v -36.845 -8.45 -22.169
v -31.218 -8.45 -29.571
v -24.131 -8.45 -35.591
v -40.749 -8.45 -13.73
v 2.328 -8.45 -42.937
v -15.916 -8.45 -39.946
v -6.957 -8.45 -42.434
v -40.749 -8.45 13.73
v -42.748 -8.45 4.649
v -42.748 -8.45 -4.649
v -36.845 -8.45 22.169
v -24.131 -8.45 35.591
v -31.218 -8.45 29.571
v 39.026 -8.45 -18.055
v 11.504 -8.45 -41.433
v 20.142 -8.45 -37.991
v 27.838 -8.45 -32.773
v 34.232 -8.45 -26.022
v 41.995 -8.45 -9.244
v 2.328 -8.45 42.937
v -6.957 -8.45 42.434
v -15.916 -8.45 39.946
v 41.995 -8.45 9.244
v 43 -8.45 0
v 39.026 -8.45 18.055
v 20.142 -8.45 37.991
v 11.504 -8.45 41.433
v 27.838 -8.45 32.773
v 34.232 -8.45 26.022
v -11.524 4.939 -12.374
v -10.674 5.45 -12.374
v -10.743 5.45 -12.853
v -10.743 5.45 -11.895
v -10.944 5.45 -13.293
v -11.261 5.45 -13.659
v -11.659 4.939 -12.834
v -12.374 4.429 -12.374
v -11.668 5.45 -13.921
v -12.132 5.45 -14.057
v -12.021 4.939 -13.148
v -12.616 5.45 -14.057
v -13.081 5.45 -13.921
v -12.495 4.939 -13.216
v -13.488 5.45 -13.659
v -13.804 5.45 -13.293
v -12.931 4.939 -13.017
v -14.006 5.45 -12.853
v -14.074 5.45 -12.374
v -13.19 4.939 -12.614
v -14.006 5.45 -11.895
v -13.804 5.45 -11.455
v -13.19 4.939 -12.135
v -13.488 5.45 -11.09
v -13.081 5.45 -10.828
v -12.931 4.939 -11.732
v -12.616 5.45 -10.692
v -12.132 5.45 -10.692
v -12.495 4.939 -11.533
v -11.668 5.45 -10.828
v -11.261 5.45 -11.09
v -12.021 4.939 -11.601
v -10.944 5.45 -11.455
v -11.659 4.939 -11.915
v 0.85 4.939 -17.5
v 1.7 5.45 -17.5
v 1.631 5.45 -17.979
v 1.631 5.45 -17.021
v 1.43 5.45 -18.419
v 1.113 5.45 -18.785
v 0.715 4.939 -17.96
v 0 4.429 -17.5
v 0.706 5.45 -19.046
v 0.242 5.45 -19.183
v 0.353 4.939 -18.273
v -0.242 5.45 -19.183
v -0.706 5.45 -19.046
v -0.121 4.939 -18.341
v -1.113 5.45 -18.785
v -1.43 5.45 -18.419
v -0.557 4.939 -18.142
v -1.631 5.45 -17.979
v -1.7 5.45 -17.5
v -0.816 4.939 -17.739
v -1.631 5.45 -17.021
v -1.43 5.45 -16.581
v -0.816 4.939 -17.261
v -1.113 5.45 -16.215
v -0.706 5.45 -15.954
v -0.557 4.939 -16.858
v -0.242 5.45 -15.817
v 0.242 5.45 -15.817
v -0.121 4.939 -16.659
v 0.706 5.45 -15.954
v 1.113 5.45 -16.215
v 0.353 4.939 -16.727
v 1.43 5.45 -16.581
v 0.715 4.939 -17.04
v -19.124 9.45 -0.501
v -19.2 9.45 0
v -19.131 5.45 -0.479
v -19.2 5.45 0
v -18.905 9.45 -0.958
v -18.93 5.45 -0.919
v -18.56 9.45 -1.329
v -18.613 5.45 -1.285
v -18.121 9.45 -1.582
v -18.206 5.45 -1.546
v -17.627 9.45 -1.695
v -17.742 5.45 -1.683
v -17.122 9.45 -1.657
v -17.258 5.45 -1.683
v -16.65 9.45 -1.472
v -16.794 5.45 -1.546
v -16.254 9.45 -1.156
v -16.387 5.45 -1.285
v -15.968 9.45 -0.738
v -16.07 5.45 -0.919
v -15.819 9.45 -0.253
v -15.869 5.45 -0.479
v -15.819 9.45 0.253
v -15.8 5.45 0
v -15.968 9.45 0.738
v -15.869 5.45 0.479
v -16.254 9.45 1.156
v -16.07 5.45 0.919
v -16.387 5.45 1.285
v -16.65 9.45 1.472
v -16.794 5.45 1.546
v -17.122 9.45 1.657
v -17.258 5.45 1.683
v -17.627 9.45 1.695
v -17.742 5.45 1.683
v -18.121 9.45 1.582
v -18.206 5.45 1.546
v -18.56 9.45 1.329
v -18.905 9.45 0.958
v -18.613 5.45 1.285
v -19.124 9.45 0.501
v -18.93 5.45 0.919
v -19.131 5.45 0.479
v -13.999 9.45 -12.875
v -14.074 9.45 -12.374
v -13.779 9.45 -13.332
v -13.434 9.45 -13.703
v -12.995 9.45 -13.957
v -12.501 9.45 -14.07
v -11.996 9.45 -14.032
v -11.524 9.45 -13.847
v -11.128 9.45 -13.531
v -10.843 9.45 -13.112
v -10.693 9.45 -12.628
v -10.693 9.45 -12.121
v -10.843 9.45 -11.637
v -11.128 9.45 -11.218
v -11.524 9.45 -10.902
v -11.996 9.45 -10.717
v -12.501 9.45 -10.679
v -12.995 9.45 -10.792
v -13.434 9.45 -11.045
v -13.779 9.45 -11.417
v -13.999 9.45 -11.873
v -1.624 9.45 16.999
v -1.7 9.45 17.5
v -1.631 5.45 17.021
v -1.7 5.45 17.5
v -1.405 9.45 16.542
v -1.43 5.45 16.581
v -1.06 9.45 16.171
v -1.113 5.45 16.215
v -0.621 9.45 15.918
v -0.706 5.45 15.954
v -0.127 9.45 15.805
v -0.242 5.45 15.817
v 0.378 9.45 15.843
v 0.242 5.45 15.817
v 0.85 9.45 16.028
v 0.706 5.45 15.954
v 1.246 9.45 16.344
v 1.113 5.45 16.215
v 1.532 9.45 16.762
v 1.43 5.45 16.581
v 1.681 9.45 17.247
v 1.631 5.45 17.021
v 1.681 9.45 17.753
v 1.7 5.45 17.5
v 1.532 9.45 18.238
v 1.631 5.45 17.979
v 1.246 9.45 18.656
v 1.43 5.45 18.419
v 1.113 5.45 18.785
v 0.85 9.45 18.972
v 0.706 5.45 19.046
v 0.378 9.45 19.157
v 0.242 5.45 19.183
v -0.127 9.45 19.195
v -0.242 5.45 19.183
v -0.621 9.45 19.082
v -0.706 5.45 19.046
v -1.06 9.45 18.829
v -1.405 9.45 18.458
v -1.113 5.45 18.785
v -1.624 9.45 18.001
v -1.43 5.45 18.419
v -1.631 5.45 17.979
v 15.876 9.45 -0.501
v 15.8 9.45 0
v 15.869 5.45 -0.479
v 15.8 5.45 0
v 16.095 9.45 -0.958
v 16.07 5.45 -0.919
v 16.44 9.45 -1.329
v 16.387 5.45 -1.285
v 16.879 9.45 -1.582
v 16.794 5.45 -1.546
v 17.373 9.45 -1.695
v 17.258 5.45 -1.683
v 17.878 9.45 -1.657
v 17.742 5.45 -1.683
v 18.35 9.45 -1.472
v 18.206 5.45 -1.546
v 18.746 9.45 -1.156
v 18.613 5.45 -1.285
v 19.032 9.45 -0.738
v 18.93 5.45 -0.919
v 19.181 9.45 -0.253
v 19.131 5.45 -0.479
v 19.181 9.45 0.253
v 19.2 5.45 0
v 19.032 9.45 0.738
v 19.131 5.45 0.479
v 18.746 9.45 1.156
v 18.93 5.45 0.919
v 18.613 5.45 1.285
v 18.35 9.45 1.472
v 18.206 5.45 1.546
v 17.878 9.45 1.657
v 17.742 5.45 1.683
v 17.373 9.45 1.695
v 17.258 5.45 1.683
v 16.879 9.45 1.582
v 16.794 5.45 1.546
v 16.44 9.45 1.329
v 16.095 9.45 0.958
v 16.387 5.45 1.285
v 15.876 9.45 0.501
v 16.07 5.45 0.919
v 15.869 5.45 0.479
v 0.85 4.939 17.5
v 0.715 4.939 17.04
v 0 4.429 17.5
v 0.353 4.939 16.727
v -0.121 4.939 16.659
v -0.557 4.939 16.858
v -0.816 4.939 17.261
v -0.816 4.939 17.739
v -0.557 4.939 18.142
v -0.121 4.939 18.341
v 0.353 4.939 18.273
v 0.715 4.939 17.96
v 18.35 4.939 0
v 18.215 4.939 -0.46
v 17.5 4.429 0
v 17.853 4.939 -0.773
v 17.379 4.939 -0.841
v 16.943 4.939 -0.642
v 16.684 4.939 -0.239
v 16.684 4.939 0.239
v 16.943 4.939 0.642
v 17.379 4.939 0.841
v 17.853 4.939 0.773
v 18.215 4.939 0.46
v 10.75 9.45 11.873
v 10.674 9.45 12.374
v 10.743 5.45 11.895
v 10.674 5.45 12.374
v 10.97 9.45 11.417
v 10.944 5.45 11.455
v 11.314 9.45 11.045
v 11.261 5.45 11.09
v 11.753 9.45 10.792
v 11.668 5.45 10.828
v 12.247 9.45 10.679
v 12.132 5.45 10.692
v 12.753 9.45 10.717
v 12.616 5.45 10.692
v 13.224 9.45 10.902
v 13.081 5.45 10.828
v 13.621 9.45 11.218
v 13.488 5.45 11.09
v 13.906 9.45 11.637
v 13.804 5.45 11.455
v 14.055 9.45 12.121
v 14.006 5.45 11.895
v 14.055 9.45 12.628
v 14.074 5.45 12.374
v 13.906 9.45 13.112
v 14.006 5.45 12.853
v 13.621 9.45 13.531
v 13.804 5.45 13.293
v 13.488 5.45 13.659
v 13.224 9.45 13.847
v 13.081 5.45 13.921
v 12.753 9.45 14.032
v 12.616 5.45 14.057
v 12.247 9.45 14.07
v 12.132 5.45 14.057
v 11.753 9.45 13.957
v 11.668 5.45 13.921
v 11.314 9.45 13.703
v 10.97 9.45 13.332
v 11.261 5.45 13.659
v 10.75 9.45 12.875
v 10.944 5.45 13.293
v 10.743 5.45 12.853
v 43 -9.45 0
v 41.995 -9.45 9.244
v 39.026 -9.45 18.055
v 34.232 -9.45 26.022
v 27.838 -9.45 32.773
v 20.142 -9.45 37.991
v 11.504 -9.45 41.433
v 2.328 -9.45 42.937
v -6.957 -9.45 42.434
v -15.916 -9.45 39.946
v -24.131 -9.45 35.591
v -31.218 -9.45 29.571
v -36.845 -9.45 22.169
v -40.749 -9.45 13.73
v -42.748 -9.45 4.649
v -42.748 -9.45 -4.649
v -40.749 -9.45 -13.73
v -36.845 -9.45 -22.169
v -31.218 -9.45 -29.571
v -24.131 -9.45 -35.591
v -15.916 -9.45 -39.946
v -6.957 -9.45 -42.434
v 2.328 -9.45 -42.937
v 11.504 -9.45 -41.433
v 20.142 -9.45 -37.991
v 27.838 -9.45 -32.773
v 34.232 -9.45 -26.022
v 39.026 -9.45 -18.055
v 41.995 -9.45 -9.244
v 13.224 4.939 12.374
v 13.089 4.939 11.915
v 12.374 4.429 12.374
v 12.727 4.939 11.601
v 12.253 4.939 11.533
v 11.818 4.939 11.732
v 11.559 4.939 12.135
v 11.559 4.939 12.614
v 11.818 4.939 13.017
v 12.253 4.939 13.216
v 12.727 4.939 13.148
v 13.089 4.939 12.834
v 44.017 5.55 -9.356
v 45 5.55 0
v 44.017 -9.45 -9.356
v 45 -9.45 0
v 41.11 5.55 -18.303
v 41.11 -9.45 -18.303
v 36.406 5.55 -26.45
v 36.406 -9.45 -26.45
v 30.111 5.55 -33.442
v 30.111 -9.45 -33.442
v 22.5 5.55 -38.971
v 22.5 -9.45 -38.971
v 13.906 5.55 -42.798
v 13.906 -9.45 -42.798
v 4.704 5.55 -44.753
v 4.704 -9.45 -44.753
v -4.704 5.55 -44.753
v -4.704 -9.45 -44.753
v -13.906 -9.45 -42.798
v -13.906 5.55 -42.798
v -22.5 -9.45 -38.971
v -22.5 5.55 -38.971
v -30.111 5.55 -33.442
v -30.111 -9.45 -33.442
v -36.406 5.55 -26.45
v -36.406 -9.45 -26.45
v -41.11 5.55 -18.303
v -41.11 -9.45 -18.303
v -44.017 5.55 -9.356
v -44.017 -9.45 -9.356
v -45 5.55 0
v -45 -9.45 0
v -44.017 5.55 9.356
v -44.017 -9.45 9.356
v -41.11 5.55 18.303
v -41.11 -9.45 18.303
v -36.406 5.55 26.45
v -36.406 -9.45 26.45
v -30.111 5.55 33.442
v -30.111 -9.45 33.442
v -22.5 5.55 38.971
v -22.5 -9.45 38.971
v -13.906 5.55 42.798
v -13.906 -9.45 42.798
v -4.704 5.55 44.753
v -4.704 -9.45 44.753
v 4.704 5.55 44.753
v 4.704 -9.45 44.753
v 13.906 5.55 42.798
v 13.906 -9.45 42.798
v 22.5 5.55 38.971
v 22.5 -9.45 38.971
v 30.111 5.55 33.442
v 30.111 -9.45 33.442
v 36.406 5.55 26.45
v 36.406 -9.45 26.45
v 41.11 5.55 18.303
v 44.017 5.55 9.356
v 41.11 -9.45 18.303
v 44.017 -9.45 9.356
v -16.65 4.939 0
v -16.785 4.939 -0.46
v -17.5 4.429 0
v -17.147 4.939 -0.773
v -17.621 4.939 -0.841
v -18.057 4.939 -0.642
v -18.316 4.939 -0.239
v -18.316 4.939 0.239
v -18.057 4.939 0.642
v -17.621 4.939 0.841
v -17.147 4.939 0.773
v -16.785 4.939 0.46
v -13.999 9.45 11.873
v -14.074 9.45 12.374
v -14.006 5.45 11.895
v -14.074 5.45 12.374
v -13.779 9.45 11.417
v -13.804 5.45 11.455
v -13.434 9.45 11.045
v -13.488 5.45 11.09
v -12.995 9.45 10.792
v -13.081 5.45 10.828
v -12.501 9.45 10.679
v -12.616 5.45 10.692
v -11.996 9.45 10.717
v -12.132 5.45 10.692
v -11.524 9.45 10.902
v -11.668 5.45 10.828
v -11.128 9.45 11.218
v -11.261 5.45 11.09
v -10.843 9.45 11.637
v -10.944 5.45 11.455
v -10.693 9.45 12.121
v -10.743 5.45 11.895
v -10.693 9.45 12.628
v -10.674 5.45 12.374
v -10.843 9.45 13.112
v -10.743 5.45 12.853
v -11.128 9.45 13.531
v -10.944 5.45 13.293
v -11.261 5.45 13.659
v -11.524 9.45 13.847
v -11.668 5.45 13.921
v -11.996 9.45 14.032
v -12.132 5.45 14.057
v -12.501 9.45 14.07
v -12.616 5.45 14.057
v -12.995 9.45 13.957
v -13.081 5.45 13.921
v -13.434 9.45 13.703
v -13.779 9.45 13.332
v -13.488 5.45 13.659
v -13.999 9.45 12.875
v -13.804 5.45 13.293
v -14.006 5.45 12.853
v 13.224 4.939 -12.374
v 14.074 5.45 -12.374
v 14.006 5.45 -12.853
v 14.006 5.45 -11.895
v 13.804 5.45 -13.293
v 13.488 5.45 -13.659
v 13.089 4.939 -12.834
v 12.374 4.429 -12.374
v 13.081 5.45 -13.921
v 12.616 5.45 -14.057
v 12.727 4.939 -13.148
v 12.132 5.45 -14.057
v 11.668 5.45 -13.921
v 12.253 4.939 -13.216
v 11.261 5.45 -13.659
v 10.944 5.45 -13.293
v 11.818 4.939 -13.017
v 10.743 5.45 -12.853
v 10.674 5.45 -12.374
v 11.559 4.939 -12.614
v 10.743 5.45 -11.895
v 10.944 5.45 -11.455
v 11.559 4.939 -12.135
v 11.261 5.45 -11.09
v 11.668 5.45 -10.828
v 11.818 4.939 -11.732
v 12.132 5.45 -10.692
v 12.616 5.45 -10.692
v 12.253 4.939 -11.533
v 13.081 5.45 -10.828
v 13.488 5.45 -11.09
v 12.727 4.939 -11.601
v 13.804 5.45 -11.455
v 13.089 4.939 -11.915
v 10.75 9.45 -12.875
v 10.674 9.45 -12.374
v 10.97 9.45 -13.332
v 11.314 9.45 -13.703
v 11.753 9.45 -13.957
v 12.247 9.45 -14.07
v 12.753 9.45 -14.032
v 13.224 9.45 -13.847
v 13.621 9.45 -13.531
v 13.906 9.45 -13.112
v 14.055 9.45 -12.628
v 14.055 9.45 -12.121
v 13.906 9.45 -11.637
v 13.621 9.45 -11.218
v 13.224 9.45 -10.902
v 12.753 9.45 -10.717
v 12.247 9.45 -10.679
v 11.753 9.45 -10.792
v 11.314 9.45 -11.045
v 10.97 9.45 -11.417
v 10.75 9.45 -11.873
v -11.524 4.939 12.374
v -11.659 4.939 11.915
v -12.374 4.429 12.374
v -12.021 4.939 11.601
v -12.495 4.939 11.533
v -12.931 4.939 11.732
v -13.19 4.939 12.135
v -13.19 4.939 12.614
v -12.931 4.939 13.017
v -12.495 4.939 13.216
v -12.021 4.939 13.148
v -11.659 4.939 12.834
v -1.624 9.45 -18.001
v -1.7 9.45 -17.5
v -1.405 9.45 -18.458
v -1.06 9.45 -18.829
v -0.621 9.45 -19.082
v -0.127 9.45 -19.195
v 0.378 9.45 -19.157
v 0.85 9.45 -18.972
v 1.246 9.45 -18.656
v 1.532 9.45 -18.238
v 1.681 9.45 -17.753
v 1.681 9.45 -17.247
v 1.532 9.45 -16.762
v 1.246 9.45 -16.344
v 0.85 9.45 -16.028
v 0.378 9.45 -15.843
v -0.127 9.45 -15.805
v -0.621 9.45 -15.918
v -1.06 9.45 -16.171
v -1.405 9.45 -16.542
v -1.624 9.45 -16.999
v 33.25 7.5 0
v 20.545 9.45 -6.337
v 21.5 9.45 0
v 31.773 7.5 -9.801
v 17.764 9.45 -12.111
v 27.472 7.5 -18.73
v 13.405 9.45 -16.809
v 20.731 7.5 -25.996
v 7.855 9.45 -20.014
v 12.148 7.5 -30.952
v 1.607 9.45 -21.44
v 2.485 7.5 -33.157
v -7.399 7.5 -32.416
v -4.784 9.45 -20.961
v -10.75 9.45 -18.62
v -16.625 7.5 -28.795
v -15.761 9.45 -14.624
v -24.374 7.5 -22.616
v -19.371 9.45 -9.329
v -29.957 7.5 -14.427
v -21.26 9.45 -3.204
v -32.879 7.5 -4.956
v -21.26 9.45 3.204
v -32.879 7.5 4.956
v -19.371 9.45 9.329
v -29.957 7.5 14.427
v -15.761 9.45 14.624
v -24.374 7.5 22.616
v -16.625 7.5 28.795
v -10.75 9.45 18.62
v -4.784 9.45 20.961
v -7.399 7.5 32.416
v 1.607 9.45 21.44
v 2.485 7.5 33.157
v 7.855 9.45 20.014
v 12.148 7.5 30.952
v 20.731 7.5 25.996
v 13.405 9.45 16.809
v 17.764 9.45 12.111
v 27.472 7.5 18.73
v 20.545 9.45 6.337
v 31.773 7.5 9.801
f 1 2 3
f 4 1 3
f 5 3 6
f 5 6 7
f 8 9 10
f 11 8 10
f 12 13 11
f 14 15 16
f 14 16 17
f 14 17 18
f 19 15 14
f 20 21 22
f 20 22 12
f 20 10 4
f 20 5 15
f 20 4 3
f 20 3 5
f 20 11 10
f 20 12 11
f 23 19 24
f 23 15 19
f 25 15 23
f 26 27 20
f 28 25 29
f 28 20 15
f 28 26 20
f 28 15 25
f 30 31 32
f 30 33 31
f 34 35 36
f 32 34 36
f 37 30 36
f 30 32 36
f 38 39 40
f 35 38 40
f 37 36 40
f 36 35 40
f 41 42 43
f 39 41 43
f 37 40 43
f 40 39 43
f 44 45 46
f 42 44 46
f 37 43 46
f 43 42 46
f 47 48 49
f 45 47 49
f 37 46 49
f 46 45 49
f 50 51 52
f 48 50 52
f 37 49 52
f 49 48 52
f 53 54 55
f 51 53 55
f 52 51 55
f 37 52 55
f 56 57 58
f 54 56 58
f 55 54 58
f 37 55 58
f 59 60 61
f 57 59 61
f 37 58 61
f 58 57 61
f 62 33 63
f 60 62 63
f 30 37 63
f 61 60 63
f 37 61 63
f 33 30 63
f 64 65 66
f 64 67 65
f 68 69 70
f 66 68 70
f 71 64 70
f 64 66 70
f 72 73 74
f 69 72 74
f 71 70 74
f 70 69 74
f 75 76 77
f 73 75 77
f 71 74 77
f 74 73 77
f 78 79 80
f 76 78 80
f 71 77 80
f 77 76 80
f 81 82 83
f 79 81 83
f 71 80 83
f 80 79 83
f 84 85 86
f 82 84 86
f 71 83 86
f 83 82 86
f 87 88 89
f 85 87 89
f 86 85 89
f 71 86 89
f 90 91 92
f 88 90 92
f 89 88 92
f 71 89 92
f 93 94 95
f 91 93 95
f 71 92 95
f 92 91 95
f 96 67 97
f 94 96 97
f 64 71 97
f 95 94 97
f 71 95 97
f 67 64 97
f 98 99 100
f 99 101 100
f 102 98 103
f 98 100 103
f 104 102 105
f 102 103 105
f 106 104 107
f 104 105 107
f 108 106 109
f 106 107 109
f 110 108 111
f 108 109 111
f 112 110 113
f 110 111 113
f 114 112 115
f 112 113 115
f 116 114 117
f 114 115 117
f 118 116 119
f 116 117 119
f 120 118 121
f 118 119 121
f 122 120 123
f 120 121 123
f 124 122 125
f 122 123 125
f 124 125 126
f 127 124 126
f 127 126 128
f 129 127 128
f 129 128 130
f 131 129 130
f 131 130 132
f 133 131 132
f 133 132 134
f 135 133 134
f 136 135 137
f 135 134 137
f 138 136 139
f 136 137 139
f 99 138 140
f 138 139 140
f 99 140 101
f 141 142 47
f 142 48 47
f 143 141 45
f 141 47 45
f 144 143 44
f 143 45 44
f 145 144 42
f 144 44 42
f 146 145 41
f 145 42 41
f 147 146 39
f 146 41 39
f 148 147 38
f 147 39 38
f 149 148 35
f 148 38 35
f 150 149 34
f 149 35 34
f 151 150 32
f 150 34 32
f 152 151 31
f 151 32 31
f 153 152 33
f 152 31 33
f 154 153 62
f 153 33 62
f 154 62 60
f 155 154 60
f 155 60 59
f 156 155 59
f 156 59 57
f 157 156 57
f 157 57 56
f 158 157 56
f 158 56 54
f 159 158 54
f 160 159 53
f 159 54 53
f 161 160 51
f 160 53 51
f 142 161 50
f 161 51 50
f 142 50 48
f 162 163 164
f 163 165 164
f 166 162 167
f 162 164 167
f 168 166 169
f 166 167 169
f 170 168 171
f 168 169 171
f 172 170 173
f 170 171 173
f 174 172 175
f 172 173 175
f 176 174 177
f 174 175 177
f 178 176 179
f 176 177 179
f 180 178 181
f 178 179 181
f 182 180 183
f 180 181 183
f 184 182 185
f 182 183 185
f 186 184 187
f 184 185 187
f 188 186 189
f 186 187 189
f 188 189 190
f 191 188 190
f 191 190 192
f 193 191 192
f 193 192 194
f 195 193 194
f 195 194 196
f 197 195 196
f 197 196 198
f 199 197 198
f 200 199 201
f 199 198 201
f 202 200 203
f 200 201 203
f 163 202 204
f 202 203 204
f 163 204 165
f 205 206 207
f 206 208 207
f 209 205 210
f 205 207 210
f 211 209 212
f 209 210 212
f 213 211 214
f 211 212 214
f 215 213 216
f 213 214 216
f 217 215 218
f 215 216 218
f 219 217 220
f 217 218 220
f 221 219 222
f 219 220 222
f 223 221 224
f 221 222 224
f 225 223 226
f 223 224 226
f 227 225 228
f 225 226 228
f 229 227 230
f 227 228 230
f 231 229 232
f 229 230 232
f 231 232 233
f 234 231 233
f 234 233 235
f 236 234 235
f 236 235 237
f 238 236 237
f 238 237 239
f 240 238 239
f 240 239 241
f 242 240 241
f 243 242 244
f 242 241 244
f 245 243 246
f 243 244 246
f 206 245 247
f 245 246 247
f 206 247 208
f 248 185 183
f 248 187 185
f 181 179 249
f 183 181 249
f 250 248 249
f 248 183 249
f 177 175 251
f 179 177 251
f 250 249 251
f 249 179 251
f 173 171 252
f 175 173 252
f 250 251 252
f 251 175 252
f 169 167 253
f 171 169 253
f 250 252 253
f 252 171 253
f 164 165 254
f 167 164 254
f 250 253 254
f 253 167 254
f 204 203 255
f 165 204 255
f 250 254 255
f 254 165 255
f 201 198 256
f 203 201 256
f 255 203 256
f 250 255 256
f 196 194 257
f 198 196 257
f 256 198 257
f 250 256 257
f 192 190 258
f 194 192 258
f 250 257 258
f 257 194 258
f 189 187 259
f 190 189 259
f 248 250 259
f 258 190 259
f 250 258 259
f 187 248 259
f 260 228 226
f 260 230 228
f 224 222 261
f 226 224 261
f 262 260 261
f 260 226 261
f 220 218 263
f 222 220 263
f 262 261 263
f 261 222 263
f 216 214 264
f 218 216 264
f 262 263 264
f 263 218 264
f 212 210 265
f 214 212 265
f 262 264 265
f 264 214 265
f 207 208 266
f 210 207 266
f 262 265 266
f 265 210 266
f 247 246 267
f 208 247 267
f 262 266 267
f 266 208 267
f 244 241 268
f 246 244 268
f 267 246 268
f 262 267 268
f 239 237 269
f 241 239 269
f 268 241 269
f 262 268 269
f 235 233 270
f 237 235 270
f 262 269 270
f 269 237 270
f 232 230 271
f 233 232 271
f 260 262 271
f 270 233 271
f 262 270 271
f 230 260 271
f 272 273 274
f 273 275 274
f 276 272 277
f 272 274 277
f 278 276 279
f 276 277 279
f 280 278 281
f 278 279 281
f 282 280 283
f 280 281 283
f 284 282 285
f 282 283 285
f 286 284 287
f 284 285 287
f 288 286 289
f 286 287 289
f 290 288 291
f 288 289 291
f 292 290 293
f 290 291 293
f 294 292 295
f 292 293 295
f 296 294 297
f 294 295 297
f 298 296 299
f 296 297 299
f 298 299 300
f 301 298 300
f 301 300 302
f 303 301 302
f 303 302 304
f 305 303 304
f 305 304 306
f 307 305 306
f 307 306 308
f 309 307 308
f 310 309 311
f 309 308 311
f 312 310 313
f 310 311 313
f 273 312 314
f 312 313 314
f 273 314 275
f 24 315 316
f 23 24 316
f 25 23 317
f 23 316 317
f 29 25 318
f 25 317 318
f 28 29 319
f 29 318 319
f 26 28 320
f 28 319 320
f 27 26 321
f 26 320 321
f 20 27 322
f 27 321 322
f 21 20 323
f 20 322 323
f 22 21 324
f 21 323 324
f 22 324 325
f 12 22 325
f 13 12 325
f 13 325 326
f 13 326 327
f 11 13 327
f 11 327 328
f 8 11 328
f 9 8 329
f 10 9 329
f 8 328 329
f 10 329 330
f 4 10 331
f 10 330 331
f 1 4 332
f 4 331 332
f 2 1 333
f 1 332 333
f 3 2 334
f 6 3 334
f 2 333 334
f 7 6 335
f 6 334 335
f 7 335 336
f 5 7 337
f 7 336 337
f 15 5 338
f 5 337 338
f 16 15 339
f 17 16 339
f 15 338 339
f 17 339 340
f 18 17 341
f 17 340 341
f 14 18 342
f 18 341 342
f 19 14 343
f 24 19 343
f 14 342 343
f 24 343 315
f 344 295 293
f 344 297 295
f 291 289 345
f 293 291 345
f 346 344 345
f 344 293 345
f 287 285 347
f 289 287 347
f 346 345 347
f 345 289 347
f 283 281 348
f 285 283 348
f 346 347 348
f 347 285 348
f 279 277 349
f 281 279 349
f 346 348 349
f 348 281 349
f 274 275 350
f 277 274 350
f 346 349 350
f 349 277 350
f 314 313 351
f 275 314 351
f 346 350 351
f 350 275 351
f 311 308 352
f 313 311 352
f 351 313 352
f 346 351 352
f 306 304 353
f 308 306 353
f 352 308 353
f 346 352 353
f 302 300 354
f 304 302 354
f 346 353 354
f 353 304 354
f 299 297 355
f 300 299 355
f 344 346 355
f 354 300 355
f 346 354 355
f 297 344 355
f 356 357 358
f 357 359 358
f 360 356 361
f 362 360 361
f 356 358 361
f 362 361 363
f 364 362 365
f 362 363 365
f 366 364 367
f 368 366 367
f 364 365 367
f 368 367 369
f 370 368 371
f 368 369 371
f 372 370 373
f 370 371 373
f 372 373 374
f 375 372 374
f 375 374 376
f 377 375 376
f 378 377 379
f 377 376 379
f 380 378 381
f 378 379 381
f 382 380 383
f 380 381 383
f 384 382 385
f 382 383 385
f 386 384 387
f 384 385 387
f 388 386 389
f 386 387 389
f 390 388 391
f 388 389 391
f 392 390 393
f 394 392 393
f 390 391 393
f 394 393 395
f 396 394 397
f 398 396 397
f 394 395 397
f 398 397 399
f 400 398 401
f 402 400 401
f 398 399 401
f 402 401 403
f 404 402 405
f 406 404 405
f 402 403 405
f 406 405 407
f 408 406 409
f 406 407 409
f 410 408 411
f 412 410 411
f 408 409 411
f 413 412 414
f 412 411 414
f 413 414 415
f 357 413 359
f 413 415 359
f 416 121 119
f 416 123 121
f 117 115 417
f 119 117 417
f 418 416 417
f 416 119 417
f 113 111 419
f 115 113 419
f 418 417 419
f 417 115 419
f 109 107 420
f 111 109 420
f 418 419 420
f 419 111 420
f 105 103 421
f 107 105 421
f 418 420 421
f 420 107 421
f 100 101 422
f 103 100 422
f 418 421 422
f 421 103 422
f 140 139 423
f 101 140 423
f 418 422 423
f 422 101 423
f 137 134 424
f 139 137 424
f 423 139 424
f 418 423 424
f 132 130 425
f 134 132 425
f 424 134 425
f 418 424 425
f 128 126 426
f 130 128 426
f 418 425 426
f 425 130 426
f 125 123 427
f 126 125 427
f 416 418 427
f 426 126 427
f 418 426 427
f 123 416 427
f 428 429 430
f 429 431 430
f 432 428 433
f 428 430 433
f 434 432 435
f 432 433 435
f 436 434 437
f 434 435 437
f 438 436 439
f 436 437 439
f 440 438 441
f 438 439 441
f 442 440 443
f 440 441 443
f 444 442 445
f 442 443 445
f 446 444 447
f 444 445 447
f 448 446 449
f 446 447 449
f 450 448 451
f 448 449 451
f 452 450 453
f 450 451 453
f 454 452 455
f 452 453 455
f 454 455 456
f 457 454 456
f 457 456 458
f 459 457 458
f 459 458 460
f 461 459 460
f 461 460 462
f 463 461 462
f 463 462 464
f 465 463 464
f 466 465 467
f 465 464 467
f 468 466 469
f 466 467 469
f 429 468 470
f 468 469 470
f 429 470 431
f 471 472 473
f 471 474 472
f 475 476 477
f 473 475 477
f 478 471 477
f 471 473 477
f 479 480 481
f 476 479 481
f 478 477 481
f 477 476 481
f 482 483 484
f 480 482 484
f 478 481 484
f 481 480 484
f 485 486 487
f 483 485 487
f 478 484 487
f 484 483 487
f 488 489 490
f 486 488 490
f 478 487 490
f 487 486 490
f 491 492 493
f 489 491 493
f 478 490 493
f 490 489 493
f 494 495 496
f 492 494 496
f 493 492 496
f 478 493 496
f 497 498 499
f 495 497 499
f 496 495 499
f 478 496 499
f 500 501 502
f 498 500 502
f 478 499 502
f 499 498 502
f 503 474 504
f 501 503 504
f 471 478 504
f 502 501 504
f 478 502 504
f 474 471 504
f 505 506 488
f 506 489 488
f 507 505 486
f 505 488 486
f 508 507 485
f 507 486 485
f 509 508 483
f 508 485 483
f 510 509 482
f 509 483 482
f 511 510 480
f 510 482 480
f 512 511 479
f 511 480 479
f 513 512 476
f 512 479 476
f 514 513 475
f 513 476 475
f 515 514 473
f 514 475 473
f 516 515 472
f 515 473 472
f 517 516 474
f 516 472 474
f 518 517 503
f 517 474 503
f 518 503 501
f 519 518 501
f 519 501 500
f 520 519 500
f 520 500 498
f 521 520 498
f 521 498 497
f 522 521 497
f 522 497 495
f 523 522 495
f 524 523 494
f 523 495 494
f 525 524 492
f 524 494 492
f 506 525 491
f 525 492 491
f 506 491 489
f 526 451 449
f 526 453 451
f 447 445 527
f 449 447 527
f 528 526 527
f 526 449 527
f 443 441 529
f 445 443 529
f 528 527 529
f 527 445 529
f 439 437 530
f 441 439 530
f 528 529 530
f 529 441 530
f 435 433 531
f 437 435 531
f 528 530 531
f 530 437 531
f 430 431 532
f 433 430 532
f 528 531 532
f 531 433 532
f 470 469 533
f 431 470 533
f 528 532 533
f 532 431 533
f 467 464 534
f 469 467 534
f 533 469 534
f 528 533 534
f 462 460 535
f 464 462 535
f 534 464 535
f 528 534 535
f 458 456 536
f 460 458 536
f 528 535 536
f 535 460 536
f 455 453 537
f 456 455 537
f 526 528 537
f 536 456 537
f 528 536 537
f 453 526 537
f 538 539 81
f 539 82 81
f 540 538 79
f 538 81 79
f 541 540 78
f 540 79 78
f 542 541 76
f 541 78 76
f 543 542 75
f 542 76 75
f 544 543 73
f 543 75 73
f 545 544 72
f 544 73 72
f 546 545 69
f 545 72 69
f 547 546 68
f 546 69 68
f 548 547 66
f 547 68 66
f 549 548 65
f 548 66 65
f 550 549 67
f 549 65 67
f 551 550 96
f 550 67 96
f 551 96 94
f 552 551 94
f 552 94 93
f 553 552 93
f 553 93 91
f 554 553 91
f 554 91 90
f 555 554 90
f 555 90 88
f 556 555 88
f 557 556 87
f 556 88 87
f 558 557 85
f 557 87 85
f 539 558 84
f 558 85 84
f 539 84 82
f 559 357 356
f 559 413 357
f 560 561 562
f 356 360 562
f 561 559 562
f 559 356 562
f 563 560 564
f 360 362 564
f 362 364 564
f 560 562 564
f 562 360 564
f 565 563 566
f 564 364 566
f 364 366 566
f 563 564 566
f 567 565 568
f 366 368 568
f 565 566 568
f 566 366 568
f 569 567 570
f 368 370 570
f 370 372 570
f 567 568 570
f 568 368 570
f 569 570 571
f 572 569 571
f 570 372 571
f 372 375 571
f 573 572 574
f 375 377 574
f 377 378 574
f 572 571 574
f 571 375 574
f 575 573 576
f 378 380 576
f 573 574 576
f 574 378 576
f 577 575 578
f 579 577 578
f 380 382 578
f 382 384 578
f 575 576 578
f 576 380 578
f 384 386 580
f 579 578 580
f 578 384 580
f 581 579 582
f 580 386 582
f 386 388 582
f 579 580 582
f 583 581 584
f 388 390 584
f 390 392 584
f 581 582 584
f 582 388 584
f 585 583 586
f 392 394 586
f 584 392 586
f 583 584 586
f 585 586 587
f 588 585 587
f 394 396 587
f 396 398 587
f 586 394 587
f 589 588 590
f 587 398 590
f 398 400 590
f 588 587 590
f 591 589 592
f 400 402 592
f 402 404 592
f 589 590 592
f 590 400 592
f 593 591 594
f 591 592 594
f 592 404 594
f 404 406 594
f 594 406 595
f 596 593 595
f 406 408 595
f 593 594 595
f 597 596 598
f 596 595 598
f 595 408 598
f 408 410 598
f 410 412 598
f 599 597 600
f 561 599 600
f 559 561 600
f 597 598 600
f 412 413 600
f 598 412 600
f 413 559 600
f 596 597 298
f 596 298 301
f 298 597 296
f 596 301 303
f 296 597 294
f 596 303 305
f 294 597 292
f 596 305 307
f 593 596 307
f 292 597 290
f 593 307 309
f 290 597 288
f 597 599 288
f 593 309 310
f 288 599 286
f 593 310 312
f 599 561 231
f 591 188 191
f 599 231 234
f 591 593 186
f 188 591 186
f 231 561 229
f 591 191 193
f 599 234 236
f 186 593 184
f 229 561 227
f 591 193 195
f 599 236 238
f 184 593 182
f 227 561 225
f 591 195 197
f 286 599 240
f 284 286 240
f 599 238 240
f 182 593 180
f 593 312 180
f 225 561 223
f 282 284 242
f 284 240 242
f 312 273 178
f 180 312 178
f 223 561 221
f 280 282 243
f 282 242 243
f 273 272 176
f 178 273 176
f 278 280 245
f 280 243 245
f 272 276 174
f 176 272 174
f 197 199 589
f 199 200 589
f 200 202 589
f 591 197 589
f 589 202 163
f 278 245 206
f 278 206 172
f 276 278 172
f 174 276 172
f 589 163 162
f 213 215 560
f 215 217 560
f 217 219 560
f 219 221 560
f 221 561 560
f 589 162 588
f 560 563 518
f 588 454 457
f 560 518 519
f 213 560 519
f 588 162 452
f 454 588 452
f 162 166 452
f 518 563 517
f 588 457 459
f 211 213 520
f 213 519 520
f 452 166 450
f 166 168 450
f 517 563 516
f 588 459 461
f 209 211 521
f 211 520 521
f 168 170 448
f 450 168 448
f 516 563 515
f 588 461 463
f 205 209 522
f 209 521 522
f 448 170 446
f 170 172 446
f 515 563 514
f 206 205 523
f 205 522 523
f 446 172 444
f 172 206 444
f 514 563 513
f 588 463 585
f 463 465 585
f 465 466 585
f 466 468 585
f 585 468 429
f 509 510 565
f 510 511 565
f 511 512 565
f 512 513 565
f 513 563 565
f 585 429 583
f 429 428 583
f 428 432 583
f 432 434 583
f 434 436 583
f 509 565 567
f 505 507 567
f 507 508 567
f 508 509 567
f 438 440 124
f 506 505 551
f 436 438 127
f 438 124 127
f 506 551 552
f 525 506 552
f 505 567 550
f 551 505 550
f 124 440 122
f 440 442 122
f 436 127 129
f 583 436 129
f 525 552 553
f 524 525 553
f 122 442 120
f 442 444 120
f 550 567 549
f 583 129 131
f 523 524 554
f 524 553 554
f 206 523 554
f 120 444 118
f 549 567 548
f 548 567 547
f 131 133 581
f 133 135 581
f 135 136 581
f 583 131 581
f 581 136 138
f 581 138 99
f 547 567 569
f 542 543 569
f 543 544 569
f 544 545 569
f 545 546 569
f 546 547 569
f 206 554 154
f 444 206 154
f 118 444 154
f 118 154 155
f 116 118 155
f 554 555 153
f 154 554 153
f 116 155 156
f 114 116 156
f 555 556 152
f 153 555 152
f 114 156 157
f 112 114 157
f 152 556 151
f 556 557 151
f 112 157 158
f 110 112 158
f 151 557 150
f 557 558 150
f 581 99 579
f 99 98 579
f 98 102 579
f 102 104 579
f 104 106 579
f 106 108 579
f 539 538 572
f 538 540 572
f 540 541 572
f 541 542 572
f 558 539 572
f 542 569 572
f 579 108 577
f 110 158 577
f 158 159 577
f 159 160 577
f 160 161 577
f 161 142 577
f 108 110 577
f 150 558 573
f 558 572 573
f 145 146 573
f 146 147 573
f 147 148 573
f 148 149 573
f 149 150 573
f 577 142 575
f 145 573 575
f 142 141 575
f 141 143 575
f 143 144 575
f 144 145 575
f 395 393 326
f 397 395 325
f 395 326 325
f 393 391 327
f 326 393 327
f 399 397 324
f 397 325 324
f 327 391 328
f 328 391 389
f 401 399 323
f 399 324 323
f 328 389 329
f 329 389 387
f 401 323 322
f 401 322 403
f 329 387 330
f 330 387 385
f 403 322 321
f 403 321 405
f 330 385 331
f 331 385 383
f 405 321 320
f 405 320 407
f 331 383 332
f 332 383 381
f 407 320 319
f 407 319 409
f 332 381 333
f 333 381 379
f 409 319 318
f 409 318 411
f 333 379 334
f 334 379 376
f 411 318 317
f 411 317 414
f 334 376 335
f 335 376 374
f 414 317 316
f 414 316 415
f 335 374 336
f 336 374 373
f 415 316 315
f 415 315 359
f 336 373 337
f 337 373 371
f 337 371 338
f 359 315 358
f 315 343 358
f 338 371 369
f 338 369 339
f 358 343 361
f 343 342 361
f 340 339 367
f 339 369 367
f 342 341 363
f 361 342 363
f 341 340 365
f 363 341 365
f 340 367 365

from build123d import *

# Parameters (mm, degrees)
SKETCH2_R                = 43
CUT_EXTRUDE1_DEPTH       = 1
M3_CLEARANCE_HOLE1_D     = 3.4
M3_CLEARANCE_HOLE1_DEPTH = 4
M3_CLEARANCE_HOLE1_TIP   = 1.021463052


with BuildPart() as part:
    # Sketch1 → Revolve1 (revolve)
    with BuildSketch(Plane.XY, mode=Mode.PRIVATE) as revolve1_sk:
        Polygon((0, -9.45), (0, 9.45), (-21.5, 9.45), (-45, 5.55), (-45, -9.45), align=None)
    revolve(revolve1_sk.sketch.rotate(Axis((0, -9.45, 0), (0, 1, 0)), 180), axis=Axis((0, -9.45, 0), (0, 1, 0)))

    # Sketch2 → Cut-Extrude1 (cut)
    with BuildSketch(Plane.XZ.offset(9.45)):
        Circle(SKETCH2_R)
    extrude(amount=-CUT_EXTRUDE1_DEPTH, mode=Mode.SUBTRACT)

    # M3 Clearance Hole1
    with Locations(Plane(origin=(0, 9.45, 0), x_dir=(1, 0, 0), z_dir=(0, 1, 0))):
        with Locations((0, 17.5), (-12.374368671, 12.374368671), (-17.5, 0), (-12.374368671, -12.374368671), (0, -17.5), (12.374368671, -12.374368671), (17.5, 0), (12.374368671, 12.374368671)):
            Hole(M3_CLEARANCE_HOLE1_D / 2, depth=M3_CLEARANCE_HOLE1_DEPTH)
            with Locations((0, 0, -(M3_CLEARANCE_HOLE1_DEPTH + M3_CLEARANCE_HOLE1_TIP / 2))):  # 118° drill point
                Cone(0, M3_CLEARANCE_HOLE1_D / 2, M3_CLEARANCE_HOLE1_TIP, mode=Mode.SUBTRACT)


solid = part.part
